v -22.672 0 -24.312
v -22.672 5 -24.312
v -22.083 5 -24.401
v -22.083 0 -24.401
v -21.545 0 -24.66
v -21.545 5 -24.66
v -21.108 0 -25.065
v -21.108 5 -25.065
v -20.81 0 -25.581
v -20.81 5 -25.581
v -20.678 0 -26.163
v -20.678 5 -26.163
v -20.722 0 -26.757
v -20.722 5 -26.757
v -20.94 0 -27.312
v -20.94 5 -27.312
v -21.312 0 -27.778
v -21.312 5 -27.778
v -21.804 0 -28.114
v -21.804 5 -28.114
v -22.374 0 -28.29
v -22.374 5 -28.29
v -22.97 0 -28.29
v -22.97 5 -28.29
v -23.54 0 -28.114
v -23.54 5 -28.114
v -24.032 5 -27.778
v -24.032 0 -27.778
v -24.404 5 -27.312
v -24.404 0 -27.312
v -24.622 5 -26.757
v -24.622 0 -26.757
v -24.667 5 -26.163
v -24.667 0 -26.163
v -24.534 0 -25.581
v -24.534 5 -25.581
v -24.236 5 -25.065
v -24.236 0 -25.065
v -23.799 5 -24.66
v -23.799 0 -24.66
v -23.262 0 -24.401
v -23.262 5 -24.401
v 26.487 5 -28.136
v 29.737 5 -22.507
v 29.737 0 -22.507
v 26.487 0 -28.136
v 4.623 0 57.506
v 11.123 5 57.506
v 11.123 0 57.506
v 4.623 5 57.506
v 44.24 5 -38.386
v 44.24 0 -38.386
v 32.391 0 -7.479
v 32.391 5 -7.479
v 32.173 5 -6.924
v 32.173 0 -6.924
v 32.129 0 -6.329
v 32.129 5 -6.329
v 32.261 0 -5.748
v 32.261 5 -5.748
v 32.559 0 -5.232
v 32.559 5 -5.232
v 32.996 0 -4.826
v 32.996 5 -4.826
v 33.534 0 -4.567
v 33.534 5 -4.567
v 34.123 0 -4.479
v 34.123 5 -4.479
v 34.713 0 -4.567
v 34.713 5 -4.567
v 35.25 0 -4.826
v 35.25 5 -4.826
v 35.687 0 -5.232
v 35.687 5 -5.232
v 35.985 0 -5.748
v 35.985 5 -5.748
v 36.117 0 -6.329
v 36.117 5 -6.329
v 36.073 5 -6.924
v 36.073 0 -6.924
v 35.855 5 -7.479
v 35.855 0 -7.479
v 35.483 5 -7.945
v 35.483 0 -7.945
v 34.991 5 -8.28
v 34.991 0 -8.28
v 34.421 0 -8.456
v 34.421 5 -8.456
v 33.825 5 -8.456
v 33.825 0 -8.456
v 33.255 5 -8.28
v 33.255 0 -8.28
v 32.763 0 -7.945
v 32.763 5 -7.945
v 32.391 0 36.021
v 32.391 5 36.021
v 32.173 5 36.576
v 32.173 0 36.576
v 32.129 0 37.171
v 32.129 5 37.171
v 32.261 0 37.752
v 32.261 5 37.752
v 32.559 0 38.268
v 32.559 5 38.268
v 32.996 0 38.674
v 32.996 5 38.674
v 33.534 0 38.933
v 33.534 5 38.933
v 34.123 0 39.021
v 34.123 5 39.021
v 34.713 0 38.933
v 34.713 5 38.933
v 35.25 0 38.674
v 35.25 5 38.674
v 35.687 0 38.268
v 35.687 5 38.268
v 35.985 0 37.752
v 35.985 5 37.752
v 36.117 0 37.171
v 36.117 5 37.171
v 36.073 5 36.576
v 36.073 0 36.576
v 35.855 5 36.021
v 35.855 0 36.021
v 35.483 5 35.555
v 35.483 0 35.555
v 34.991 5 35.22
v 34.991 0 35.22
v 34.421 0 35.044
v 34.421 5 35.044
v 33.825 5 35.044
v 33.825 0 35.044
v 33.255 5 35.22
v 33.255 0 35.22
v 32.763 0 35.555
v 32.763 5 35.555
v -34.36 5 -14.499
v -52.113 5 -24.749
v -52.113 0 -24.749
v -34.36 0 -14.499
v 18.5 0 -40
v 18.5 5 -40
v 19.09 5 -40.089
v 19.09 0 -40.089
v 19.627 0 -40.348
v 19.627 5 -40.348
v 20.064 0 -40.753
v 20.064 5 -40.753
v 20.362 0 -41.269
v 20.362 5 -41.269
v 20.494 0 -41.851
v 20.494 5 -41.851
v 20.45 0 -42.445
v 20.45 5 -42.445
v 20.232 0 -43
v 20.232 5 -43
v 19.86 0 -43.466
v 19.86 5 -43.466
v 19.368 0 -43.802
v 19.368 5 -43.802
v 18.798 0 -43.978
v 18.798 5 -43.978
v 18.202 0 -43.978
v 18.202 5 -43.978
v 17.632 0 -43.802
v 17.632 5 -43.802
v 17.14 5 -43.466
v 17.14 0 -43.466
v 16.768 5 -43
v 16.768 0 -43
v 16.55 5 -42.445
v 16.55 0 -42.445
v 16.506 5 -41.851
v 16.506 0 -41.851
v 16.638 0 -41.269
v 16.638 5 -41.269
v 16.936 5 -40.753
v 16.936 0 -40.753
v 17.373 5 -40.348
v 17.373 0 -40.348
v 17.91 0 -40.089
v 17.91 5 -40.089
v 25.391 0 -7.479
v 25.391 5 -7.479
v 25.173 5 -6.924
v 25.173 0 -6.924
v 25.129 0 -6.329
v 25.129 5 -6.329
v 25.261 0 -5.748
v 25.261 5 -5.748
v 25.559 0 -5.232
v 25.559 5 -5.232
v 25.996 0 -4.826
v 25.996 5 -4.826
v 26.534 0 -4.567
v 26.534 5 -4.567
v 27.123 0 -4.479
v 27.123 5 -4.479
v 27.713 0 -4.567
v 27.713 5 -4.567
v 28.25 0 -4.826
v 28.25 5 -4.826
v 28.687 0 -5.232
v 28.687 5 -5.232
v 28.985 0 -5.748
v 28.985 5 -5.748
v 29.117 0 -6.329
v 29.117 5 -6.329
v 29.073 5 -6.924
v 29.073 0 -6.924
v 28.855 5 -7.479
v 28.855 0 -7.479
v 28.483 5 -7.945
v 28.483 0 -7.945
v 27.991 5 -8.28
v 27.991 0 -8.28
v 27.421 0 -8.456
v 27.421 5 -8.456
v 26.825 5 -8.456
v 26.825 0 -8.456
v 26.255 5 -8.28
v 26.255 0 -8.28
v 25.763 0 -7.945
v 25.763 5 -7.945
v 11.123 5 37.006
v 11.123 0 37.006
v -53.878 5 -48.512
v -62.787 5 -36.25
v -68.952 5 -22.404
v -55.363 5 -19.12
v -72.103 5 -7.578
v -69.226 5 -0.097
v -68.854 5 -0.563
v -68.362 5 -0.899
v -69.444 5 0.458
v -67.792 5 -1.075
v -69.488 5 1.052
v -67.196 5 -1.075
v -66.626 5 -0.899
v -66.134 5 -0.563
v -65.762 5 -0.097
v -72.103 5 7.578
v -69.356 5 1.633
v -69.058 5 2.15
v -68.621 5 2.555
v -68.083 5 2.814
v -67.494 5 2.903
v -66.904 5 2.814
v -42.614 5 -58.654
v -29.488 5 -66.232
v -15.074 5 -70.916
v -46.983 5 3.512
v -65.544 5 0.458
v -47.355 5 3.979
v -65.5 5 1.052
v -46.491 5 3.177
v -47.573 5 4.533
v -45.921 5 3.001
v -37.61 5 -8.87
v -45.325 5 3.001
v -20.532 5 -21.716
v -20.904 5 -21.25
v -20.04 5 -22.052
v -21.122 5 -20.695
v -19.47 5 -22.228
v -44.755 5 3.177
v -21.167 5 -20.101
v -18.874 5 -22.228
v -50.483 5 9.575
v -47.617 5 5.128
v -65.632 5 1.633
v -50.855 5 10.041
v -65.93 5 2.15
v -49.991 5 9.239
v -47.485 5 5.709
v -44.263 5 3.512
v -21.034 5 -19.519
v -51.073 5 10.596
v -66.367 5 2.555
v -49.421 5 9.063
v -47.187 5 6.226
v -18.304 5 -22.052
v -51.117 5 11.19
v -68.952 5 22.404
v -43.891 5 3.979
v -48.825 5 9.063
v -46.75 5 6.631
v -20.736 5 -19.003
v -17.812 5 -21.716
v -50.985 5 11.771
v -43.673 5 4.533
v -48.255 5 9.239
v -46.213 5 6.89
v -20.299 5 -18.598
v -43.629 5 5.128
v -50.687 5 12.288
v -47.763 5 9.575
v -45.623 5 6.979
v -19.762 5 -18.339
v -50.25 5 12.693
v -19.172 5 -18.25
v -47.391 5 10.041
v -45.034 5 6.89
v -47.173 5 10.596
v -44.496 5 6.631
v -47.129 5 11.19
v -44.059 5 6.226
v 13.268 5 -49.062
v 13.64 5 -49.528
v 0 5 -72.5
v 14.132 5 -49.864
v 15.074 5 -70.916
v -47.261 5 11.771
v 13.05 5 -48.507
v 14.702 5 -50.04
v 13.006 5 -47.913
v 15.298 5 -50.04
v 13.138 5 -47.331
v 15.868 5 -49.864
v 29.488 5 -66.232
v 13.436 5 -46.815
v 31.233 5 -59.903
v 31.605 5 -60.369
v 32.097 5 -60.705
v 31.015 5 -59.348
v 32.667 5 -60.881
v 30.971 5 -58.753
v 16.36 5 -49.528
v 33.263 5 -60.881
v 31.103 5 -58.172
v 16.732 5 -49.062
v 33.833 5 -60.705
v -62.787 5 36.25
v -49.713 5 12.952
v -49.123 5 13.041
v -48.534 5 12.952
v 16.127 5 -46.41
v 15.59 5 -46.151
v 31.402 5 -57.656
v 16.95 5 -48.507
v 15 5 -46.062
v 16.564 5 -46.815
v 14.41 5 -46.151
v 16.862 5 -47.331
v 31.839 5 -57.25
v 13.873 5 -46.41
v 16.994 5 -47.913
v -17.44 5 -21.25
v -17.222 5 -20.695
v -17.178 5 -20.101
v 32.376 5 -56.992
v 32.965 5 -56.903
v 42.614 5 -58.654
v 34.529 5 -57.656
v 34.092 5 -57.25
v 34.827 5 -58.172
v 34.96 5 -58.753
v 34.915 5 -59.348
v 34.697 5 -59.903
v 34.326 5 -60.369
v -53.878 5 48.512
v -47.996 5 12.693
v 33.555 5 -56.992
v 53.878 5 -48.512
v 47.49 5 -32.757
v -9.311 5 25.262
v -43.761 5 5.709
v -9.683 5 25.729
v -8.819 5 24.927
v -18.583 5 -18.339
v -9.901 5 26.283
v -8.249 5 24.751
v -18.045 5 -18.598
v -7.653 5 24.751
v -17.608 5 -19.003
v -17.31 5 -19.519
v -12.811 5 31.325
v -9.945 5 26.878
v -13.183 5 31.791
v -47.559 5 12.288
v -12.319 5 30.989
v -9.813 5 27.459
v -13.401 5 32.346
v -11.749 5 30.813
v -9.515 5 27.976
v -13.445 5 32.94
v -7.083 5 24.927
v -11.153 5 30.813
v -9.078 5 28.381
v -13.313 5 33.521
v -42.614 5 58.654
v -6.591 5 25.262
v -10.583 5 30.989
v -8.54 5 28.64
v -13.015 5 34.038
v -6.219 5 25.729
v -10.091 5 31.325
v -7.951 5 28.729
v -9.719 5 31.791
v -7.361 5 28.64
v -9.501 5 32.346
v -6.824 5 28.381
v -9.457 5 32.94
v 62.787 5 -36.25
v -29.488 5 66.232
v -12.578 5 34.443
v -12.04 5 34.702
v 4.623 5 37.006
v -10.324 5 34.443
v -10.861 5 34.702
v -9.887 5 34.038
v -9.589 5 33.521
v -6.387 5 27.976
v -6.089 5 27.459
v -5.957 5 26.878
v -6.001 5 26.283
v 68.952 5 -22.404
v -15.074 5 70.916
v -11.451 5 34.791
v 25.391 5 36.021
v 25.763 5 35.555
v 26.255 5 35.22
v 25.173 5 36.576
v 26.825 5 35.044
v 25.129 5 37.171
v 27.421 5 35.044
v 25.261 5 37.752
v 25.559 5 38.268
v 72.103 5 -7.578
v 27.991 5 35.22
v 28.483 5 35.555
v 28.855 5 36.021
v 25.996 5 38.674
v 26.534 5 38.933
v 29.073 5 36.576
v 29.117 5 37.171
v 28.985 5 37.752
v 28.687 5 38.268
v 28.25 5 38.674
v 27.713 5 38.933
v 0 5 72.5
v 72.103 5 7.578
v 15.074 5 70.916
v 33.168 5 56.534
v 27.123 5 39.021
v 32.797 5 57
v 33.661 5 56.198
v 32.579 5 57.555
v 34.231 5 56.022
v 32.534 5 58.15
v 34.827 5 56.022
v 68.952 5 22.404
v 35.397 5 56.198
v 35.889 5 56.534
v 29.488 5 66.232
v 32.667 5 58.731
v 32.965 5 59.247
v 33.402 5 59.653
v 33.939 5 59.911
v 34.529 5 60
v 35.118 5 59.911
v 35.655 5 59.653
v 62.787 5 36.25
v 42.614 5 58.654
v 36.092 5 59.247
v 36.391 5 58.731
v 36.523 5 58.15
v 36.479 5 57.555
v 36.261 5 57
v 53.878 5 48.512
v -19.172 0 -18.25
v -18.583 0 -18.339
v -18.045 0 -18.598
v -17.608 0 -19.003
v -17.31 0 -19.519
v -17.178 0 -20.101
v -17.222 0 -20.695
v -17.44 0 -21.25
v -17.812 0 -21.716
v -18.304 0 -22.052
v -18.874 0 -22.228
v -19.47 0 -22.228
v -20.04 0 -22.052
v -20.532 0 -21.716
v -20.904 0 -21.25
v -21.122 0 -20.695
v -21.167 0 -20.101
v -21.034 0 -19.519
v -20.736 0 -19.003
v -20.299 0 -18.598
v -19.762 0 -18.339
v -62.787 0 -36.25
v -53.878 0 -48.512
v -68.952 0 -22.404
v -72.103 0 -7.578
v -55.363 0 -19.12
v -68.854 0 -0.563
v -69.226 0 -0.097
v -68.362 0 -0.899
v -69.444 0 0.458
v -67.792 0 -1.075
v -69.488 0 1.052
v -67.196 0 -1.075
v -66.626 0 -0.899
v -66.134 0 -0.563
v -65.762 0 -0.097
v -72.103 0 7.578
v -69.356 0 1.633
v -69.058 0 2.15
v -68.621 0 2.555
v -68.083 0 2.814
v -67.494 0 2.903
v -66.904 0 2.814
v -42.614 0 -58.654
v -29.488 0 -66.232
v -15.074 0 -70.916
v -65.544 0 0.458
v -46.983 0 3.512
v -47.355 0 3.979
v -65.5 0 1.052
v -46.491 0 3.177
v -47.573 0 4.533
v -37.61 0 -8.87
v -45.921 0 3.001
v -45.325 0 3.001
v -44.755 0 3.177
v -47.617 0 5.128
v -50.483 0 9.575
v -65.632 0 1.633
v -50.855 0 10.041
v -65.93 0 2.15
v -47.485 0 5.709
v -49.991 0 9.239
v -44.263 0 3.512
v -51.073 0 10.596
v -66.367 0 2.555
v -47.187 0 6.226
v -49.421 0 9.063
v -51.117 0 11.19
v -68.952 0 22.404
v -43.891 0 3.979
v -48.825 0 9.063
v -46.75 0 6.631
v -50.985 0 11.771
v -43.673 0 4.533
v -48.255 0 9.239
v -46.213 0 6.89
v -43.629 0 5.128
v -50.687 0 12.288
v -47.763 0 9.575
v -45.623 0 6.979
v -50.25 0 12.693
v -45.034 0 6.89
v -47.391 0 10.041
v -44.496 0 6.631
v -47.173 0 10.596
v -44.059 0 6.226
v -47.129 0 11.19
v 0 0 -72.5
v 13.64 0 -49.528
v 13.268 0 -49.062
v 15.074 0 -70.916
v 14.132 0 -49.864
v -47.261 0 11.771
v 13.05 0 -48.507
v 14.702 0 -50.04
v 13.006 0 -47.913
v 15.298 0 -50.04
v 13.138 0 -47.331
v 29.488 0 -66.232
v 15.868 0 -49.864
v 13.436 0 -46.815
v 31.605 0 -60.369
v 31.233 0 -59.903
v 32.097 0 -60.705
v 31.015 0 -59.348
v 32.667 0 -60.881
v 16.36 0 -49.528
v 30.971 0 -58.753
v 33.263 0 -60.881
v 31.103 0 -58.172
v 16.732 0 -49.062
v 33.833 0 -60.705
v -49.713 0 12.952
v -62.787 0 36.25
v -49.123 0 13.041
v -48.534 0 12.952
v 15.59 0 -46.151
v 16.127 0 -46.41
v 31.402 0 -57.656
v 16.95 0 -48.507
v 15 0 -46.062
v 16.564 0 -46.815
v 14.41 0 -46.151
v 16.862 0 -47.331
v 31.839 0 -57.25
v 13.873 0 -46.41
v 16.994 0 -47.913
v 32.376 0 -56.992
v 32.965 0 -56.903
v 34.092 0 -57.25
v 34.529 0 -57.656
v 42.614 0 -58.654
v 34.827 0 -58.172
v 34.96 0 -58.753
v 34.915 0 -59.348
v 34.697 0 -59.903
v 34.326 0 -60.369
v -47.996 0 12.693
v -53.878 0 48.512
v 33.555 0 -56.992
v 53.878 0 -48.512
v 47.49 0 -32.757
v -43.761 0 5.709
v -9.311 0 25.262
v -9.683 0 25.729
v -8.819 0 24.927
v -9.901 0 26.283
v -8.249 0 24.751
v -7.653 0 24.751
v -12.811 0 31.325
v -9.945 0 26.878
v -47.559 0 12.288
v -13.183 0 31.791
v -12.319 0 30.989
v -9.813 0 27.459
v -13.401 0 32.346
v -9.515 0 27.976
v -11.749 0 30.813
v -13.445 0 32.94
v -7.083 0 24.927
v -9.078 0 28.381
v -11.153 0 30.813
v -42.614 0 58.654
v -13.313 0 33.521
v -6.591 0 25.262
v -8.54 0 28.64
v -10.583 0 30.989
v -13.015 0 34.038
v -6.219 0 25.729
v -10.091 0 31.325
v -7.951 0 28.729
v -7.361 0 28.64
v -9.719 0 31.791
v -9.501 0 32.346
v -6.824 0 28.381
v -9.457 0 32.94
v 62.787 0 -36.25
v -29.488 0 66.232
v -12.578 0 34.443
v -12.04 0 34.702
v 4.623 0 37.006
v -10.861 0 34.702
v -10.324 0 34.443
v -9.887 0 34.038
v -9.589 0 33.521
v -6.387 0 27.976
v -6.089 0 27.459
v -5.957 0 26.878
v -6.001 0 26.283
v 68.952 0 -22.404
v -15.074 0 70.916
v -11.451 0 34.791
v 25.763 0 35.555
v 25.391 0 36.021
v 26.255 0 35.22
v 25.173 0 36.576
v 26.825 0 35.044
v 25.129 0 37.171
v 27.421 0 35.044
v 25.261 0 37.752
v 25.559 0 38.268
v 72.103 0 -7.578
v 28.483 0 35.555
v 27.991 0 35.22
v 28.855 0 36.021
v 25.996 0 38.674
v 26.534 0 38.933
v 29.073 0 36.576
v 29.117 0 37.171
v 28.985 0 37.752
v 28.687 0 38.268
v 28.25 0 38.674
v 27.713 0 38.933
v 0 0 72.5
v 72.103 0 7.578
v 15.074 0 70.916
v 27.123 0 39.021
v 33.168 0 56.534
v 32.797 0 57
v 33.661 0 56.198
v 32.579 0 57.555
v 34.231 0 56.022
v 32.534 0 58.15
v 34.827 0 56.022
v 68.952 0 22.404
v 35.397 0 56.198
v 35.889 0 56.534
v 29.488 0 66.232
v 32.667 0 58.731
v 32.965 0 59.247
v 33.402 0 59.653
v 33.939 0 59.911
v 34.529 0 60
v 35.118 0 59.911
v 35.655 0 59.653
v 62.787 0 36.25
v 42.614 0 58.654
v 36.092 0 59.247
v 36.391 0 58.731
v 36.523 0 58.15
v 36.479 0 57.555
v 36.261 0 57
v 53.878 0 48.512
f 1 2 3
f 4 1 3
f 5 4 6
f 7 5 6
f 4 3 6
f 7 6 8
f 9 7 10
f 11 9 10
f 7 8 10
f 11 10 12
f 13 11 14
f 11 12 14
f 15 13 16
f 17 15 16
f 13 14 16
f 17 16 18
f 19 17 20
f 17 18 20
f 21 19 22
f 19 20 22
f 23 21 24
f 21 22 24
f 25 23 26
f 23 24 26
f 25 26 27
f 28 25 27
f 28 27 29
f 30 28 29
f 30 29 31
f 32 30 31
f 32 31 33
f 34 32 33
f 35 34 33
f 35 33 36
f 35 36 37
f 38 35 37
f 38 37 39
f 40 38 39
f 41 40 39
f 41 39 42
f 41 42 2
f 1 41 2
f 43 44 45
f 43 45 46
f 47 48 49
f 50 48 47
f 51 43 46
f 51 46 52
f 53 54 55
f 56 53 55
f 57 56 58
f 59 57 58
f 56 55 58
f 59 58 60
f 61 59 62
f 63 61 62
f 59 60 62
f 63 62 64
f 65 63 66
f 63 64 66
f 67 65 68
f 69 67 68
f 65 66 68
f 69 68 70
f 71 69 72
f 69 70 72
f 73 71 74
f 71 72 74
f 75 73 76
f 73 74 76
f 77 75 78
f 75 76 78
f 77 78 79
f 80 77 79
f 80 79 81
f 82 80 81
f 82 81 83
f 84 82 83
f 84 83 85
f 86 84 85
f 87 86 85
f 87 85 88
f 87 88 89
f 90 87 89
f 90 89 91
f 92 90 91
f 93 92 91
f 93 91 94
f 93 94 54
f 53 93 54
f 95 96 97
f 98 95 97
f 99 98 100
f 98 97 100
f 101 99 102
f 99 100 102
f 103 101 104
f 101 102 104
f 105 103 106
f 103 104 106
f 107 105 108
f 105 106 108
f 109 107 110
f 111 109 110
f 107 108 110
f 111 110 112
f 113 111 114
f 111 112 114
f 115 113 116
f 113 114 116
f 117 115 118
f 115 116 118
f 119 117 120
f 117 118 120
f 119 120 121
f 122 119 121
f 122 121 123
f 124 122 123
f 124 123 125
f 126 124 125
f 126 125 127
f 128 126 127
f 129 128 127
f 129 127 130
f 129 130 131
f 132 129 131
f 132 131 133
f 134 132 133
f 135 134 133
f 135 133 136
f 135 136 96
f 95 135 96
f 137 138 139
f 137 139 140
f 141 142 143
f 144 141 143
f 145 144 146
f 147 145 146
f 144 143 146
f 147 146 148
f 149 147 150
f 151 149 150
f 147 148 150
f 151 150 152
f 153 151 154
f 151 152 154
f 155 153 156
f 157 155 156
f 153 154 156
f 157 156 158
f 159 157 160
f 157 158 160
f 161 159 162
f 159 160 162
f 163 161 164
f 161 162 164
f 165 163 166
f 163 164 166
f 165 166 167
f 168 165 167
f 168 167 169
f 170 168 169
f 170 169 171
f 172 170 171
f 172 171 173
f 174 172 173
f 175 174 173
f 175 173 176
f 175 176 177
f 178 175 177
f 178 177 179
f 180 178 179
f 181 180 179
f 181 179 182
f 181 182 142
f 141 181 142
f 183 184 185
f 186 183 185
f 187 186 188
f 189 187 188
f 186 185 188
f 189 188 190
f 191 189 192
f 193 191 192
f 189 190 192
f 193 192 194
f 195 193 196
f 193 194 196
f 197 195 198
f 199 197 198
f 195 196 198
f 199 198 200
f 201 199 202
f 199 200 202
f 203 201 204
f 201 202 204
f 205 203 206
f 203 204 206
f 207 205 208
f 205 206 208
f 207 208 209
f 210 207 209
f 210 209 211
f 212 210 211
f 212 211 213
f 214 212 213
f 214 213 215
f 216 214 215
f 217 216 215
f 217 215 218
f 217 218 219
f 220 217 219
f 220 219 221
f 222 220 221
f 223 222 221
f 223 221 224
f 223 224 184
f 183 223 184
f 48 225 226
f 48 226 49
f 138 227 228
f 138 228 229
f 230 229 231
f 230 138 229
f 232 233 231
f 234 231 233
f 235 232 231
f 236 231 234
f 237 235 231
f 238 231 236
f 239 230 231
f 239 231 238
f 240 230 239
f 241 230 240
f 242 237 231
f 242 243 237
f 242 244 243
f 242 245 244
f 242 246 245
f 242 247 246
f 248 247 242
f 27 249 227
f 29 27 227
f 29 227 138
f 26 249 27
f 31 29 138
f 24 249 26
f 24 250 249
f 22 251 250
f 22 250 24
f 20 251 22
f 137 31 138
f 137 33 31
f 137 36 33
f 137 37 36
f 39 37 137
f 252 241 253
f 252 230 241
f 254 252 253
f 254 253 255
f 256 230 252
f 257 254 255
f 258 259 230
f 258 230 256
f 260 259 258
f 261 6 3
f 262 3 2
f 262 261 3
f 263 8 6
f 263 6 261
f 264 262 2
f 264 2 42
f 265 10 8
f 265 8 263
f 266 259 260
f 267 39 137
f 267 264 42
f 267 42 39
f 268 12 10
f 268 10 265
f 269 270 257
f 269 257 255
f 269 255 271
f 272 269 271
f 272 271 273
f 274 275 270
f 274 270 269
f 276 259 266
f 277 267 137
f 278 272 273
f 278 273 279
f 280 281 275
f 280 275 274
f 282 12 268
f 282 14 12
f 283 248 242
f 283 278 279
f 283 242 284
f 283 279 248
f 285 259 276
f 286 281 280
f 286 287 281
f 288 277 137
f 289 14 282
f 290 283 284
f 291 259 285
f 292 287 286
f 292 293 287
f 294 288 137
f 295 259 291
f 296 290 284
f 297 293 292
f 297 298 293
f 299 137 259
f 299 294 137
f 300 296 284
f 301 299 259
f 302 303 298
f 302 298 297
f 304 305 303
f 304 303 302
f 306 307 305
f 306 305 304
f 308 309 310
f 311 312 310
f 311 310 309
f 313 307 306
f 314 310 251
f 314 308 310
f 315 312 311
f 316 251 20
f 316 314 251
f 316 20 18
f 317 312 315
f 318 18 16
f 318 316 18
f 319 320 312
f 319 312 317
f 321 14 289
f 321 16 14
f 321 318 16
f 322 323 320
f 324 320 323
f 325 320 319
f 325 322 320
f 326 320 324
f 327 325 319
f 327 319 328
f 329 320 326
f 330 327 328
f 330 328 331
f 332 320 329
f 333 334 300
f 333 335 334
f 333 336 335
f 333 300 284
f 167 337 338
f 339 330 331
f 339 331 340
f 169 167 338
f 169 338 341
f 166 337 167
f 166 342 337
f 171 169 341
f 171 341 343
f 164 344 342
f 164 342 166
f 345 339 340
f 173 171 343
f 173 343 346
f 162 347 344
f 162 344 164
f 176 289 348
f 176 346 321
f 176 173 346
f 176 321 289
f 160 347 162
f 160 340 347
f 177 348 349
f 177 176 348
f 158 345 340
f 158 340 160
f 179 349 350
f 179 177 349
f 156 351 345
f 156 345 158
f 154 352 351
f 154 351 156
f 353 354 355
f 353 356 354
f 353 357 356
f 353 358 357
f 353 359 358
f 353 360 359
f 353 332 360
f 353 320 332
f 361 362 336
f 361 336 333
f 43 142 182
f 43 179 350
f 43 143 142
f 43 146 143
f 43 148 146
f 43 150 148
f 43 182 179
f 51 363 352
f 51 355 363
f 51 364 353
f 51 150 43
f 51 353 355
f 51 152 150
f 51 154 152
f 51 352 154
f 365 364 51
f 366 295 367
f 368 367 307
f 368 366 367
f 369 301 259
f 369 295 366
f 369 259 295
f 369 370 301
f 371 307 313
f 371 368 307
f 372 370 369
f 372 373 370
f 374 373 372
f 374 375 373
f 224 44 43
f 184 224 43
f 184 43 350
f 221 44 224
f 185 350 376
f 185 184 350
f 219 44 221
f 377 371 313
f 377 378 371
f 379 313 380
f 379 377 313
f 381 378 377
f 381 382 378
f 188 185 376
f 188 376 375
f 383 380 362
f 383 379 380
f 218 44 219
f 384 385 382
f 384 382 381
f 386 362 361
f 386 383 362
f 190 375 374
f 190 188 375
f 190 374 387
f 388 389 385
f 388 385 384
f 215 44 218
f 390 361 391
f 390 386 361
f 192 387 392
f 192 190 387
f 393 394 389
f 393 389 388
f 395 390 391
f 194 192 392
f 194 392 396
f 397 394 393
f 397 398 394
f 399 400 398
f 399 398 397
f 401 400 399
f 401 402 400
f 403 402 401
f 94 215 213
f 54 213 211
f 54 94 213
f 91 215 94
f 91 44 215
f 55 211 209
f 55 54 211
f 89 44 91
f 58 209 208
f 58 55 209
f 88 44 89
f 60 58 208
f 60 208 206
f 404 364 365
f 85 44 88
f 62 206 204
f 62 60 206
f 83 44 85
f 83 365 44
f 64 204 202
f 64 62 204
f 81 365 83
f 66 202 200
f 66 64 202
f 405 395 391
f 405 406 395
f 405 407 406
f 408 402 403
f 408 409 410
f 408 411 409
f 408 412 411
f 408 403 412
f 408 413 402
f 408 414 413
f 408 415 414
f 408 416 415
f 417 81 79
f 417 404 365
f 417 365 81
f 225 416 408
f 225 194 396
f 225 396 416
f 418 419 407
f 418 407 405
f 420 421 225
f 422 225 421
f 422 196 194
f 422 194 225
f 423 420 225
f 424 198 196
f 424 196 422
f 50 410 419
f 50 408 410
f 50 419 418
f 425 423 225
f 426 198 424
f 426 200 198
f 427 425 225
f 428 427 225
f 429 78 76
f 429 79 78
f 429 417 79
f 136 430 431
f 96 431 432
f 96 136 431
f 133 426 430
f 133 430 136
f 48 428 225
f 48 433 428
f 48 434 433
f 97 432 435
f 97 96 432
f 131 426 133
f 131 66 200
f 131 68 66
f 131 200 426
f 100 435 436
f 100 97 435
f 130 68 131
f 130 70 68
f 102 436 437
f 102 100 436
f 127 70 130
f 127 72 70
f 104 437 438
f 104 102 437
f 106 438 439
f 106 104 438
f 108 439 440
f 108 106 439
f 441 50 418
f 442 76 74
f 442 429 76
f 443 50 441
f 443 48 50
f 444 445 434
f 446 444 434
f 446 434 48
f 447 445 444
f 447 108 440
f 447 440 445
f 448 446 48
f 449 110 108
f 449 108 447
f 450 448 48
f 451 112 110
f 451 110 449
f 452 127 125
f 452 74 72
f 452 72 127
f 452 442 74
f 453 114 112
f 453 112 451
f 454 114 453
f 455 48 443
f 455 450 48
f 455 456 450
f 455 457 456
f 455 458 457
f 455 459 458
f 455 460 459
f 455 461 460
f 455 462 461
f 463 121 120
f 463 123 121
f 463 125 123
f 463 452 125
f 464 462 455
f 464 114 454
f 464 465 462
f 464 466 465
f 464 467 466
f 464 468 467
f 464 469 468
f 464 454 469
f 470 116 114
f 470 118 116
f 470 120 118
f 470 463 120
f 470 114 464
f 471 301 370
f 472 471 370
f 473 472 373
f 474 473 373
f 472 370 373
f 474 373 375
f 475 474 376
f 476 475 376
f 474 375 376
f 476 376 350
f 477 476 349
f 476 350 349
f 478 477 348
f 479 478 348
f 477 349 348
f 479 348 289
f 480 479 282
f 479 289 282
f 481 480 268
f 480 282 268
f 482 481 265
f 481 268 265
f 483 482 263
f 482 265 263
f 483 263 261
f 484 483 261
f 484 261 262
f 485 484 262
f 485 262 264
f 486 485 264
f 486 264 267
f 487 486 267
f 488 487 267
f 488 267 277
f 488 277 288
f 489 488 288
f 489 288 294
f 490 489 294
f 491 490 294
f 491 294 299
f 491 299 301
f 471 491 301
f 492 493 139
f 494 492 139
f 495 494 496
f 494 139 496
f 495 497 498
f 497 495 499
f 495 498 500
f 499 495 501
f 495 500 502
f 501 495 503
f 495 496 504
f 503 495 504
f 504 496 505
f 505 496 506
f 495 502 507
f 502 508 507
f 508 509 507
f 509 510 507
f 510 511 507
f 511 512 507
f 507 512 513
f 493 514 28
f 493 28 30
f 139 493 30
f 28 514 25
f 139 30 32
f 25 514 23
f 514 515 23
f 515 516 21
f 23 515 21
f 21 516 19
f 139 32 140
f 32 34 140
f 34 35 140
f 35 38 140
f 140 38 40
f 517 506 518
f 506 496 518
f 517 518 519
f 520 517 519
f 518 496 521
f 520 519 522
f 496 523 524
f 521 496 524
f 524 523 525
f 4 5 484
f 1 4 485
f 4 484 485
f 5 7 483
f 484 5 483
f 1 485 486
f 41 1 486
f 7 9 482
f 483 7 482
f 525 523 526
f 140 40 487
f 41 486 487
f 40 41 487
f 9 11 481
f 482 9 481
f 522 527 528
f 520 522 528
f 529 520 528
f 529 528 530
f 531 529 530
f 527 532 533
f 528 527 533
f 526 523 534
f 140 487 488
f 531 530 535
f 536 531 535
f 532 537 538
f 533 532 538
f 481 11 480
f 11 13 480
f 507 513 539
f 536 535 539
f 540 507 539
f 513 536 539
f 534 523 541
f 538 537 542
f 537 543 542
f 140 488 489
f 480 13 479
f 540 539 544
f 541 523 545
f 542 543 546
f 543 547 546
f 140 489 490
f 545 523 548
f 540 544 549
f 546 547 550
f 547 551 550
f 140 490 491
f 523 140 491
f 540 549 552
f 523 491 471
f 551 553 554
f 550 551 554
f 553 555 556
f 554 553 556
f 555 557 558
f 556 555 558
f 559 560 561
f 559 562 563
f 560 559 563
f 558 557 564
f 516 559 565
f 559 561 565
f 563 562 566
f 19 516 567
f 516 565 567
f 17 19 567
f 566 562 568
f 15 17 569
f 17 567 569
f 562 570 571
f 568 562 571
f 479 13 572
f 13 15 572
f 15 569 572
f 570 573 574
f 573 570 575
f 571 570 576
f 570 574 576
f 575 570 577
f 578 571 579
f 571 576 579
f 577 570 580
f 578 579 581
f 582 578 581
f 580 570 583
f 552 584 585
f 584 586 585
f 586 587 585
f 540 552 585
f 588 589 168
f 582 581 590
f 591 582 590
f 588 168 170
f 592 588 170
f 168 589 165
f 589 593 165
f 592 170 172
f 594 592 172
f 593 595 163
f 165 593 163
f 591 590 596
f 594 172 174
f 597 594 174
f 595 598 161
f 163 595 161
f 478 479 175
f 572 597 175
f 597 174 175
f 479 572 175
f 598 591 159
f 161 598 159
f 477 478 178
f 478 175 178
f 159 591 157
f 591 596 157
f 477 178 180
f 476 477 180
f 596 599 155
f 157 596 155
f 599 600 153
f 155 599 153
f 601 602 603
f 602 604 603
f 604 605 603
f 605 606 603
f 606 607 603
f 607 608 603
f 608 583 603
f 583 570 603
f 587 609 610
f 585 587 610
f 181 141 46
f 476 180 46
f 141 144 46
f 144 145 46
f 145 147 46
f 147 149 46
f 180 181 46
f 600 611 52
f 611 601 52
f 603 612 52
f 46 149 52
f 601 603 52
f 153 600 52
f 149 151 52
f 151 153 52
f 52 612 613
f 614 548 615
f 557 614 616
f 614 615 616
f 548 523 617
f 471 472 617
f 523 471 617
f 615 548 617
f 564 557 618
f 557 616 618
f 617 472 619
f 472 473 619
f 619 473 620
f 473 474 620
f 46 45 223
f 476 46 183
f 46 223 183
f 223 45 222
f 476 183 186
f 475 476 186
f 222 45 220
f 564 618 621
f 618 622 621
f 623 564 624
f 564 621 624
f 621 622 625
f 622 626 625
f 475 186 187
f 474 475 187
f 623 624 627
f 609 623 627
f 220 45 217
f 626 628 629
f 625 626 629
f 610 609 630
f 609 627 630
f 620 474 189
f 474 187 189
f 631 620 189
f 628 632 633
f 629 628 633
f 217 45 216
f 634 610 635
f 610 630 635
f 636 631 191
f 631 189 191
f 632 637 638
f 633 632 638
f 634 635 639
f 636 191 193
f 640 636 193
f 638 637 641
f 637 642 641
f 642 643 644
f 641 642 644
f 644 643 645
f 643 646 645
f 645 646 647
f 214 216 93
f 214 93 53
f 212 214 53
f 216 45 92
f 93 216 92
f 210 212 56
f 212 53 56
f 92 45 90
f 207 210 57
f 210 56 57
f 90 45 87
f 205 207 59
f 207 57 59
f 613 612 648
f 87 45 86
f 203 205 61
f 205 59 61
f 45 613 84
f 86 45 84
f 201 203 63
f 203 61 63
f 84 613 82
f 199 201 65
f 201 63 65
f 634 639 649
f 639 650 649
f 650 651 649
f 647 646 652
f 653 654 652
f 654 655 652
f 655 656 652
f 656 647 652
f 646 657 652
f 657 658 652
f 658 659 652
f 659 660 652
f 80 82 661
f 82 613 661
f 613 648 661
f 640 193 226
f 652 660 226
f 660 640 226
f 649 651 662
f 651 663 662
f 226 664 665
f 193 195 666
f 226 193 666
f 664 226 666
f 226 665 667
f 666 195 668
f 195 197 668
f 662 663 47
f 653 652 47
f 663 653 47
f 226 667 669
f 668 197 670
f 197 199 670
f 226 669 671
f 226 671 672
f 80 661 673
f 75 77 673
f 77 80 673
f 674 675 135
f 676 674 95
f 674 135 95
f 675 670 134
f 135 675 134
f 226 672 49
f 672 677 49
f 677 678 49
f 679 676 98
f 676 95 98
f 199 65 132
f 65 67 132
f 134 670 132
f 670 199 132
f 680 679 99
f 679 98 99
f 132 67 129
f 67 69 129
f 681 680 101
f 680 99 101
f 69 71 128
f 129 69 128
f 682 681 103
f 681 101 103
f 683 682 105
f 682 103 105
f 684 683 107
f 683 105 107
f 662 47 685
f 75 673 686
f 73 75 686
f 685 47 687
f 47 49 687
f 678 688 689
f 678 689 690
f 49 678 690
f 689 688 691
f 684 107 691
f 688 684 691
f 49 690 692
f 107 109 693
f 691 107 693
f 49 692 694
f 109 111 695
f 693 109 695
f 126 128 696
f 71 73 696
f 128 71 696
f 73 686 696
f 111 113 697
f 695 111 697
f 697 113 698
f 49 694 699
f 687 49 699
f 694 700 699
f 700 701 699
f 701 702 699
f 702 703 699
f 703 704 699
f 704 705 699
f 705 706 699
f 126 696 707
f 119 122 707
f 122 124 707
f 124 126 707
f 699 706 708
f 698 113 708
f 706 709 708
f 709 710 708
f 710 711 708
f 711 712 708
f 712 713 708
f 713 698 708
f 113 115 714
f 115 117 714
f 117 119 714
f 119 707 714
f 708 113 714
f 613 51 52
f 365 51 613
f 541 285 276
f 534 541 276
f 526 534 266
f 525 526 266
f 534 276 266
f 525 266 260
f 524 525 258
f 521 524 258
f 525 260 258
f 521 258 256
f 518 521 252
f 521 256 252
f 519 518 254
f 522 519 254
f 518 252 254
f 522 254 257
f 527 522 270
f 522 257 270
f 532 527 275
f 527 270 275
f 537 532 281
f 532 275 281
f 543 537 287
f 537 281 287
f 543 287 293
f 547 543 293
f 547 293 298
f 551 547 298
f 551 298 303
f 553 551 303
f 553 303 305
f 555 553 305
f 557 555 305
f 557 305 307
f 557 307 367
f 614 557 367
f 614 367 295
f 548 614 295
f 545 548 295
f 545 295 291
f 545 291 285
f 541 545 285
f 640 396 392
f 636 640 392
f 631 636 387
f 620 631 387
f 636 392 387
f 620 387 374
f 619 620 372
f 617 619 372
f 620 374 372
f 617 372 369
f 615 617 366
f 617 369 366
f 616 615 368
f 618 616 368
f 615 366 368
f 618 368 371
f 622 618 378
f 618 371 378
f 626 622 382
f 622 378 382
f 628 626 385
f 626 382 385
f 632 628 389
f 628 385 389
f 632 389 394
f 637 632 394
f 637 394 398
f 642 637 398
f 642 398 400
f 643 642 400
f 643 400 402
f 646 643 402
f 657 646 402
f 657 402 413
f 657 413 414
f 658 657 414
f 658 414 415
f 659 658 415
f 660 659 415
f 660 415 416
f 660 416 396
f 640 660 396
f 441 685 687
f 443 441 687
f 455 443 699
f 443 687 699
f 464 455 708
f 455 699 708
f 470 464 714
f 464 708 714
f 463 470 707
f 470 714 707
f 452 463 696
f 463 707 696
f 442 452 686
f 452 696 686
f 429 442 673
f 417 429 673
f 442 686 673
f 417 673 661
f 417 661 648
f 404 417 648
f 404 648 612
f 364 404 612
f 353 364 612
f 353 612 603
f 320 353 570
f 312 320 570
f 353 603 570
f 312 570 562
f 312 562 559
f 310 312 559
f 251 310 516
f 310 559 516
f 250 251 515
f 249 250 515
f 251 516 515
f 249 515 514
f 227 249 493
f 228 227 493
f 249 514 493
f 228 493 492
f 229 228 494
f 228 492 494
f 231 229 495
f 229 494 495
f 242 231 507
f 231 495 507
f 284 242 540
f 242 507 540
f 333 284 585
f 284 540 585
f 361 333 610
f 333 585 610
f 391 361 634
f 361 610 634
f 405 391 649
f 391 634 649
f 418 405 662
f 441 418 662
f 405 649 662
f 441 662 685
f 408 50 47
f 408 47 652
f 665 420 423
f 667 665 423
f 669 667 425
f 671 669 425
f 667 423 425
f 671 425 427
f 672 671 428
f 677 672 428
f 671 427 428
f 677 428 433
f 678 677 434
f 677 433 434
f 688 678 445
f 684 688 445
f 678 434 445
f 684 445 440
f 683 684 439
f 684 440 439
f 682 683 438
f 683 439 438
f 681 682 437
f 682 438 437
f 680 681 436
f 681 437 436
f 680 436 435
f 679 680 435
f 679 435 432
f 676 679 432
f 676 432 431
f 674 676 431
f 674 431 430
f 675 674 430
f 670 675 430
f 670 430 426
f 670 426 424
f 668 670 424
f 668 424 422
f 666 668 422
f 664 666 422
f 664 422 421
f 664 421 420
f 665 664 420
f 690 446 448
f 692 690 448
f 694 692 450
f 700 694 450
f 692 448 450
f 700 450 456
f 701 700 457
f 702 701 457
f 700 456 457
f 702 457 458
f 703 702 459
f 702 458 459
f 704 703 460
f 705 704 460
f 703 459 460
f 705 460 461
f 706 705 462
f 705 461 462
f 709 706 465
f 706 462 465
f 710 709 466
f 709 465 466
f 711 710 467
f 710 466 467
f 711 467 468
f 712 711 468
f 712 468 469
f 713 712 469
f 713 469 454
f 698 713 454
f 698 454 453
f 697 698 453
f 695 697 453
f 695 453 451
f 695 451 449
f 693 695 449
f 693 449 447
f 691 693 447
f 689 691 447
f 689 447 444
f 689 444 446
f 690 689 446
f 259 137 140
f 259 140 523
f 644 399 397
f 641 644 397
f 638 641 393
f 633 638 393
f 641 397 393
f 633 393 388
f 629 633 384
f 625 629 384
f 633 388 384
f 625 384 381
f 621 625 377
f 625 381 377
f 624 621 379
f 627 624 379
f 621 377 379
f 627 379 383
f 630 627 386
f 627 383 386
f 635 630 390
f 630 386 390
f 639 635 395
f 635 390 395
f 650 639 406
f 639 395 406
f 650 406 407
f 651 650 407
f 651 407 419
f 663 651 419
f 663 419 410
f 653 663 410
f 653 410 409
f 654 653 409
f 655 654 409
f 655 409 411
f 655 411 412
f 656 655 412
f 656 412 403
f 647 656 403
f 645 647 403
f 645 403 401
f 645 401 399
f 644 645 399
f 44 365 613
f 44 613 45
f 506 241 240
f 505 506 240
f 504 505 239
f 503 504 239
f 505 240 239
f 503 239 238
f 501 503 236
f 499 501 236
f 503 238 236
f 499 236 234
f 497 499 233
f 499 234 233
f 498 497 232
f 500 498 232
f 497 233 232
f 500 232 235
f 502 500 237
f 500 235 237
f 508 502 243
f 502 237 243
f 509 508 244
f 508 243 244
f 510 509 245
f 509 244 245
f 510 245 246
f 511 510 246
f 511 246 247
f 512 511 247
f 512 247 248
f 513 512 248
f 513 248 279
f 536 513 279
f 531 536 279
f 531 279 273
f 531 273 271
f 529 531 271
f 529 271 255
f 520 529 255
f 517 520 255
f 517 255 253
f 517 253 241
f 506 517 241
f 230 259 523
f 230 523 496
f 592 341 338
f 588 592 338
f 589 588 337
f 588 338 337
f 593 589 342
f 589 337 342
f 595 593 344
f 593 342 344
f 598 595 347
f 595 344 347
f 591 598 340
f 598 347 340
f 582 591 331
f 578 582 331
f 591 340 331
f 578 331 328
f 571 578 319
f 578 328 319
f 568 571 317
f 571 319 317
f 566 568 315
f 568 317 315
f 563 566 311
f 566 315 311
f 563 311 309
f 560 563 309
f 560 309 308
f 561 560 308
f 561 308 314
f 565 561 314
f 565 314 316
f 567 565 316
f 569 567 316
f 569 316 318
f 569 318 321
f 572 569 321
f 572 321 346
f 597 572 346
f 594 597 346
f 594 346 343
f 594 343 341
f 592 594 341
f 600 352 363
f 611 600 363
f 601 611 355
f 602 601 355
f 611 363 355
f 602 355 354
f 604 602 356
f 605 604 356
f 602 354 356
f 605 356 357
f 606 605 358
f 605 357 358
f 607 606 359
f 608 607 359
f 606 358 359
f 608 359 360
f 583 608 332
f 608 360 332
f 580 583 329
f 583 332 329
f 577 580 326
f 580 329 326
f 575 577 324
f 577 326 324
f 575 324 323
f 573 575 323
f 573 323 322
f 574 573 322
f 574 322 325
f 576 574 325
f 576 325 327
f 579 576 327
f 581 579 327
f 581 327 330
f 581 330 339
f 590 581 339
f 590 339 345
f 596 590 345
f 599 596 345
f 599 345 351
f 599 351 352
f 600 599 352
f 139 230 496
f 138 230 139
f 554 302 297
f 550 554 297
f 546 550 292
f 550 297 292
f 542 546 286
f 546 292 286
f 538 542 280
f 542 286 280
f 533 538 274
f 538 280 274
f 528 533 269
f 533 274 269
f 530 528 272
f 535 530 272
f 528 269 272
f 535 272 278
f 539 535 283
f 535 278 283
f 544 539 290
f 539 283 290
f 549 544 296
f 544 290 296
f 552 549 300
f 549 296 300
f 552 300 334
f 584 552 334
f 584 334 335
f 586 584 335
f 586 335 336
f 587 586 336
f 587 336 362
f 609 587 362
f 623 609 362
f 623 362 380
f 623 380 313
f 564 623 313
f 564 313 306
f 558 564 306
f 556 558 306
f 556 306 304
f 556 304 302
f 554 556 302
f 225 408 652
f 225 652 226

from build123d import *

# Parameters (mm, degrees)
SKETCH1_R           = 72.5
BOSS_EXTRUDE1_DEPTH = 5
CUT_EXTRUDE6_REACH  = 104.652
SKETCH7_R           = 2
CIRPATTERN1_COUNT   = 3


with BuildPart() as part:
    # Sketch1 → Boss-Extrude1 (new body)
    with BuildSketch(Plane(origin=(0, 0, 0), x_dir=(1, 0, 0), z_dir=(0, 1, 0))):
        with Locations(Location((0, 0, 0), (0, 0, 270))):
            Circle(SKETCH1_R)
    extrude(amount=BOSS_EXTRUDE1_DEPTH)

    # Sketch7 → Cut-Extrude6 (cut, up to next)
    with BuildSketch(Plane(origin=(0, 5, 0), x_dir=(1, 0, 0), z_dir=(0, 1, 0)), mode=Mode.PRIVATE) as cut_extrude6_sk1:
        with Locations(Location((15, 48.062177826, 0), (0, 0, 270))):
            Circle(SKETCH7_R)
    cut_extrude6_tool1 = extrude(cut_extrude6_sk1.sketch, amount=-CUT_EXTRUDE6_REACH, mode=Mode.PRIVATE) & part.part
    # Sketch7 → Cut-Extrude6 (cut, up to next)
    with BuildSketch(Plane(origin=(0, 5, 0), x_dir=(1, 0, 0), z_dir=(0, 1, 0)), mode=Mode.PRIVATE) as cut_extrude6_sk2:
        with Locations(Location((18.5, 42, 0), (0, 0, 270))):
            Circle(SKETCH7_R)
    cut_extrude6_tool2 = extrude(cut_extrude6_sk2.sketch, amount=-CUT_EXTRUDE6_REACH, mode=Mode.PRIVATE) & part.part
    # Sketch7 → Cut-Extrude6 (cut, up to next)
    with BuildSketch(Plane(origin=(0, 5, 0), x_dir=(1, 0, 0), z_dir=(0, 1, 0)), mode=Mode.PRIVATE) as cut_extrude6_sk3:
        with Locations(Location((-22.672105065, 26.312177826, 0), (0, 0, 270))):
            Circle(SKETCH7_R)
    cut_extrude6_tool3 = extrude(cut_extrude6_sk3.sketch, amount=-CUT_EXTRUDE6_REACH, mode=Mode.PRIVATE) & part.part
    # Sketch7 → Cut-Extrude6 (cut, up to next)
    with BuildSketch(Plane(origin=(0, 5, 0), x_dir=(1, 0, 0), z_dir=(0, 1, 0)), mode=Mode.PRIVATE) as cut_extrude6_sk4:
        with Locations(Location((-19.172105065, 20.25, 0), (0, 0, 270))):
            Circle(SKETCH7_R)
    cut_extrude6_tool4 = extrude(cut_extrude6_sk4.sketch, amount=-CUT_EXTRUDE6_REACH, mode=Mode.PRIVATE) & part.part
    # Sketch7 → Cut-Extrude6 (cut, up to next)
    with BuildSketch(Plane(origin=(0, 5, 0), x_dir=(1, 0, 0), z_dir=(0, 1, 0)), mode=Mode.PRIVATE) as cut_extrude6_sk5:
        with Locations(Location((32.965163285, 58.902869281, 0), (0, 0, 270))):
            Circle(SKETCH7_R)
    cut_extrude6_tool5 = extrude(cut_extrude6_sk5.sketch, amount=-CUT_EXTRUDE6_REACH, mode=Mode.PRIVATE) & part.part
    # Sketch7 → Cut-Extrude6 (cut, up to next)
    with BuildSketch(Plane(origin=(0, 5, 0), x_dir=(1, 0, 0), z_dir=(0, 1, 0)), mode=Mode.PRIVATE) as cut_extrude6_sk6:
        Polygon((26.486526778, 28.135814771), (44.240047555, 38.385814771), (47.490047555, 32.756649646), (29.736526778, 22.506649646), align=None)
    cut_extrude6_tool6 = extrude(cut_extrude6_sk6.sketch, amount=-CUT_EXTRUDE6_REACH, mode=Mode.PRIVATE) & part.part
    cut_extrude6_1 = cut_extrude6_tool1.solids().sort_by_distance((15, 5, -48.062178))[0]
    add(cut_extrude6_1, mode=Mode.SUBTRACT)
    cut_extrude6_2 = cut_extrude6_tool2.solids().sort_by_distance((18.5, 5, -42))[0]
    add(cut_extrude6_2, mode=Mode.SUBTRACT)
    cut_extrude6_3 = cut_extrude6_tool3.solids().sort_by_distance((-22.672105, 5, -26.312178))[0]
    add(cut_extrude6_3, mode=Mode.SUBTRACT)
    cut_extrude6_4 = cut_extrude6_tool4.solids().sort_by_distance((-19.172105, 5, -20.25))[0]
    add(cut_extrude6_4, mode=Mode.SUBTRACT)
    cut_extrude6_5 = cut_extrude6_tool5.solids().sort_by_distance((32.965163, 5, -58.902869))[0]
    add(cut_extrude6_5, mode=Mode.SUBTRACT)
    cut_extrude6_6 = cut_extrude6_tool6.solids().sort_by_distance((36.988287, 5, -30.446232))[0]
    add(cut_extrude6_6, mode=Mode.SUBTRACT)
    cut_extrude6 = cut_extrude6_1 + cut_extrude6_2 + cut_extrude6_3 + cut_extrude6_4 + cut_extrude6_5 + cut_extrude6_6  # Cut-Extrude6 as one shape, for the pattern or mirror that repeats it

    # CirPattern1: Cut-Extrude6 ×3 about axis
    cirpattern1_axis = Axis((0, 0, 0), (0, 1, 0))
    for i in range(1, CIRPATTERN1_COUNT):
        add(cut_extrude6.rotate(cirpattern1_axis, i * 360 / CIRPATTERN1_COUNT), mode=Mode.SUBTRACT)


solid = part.part
